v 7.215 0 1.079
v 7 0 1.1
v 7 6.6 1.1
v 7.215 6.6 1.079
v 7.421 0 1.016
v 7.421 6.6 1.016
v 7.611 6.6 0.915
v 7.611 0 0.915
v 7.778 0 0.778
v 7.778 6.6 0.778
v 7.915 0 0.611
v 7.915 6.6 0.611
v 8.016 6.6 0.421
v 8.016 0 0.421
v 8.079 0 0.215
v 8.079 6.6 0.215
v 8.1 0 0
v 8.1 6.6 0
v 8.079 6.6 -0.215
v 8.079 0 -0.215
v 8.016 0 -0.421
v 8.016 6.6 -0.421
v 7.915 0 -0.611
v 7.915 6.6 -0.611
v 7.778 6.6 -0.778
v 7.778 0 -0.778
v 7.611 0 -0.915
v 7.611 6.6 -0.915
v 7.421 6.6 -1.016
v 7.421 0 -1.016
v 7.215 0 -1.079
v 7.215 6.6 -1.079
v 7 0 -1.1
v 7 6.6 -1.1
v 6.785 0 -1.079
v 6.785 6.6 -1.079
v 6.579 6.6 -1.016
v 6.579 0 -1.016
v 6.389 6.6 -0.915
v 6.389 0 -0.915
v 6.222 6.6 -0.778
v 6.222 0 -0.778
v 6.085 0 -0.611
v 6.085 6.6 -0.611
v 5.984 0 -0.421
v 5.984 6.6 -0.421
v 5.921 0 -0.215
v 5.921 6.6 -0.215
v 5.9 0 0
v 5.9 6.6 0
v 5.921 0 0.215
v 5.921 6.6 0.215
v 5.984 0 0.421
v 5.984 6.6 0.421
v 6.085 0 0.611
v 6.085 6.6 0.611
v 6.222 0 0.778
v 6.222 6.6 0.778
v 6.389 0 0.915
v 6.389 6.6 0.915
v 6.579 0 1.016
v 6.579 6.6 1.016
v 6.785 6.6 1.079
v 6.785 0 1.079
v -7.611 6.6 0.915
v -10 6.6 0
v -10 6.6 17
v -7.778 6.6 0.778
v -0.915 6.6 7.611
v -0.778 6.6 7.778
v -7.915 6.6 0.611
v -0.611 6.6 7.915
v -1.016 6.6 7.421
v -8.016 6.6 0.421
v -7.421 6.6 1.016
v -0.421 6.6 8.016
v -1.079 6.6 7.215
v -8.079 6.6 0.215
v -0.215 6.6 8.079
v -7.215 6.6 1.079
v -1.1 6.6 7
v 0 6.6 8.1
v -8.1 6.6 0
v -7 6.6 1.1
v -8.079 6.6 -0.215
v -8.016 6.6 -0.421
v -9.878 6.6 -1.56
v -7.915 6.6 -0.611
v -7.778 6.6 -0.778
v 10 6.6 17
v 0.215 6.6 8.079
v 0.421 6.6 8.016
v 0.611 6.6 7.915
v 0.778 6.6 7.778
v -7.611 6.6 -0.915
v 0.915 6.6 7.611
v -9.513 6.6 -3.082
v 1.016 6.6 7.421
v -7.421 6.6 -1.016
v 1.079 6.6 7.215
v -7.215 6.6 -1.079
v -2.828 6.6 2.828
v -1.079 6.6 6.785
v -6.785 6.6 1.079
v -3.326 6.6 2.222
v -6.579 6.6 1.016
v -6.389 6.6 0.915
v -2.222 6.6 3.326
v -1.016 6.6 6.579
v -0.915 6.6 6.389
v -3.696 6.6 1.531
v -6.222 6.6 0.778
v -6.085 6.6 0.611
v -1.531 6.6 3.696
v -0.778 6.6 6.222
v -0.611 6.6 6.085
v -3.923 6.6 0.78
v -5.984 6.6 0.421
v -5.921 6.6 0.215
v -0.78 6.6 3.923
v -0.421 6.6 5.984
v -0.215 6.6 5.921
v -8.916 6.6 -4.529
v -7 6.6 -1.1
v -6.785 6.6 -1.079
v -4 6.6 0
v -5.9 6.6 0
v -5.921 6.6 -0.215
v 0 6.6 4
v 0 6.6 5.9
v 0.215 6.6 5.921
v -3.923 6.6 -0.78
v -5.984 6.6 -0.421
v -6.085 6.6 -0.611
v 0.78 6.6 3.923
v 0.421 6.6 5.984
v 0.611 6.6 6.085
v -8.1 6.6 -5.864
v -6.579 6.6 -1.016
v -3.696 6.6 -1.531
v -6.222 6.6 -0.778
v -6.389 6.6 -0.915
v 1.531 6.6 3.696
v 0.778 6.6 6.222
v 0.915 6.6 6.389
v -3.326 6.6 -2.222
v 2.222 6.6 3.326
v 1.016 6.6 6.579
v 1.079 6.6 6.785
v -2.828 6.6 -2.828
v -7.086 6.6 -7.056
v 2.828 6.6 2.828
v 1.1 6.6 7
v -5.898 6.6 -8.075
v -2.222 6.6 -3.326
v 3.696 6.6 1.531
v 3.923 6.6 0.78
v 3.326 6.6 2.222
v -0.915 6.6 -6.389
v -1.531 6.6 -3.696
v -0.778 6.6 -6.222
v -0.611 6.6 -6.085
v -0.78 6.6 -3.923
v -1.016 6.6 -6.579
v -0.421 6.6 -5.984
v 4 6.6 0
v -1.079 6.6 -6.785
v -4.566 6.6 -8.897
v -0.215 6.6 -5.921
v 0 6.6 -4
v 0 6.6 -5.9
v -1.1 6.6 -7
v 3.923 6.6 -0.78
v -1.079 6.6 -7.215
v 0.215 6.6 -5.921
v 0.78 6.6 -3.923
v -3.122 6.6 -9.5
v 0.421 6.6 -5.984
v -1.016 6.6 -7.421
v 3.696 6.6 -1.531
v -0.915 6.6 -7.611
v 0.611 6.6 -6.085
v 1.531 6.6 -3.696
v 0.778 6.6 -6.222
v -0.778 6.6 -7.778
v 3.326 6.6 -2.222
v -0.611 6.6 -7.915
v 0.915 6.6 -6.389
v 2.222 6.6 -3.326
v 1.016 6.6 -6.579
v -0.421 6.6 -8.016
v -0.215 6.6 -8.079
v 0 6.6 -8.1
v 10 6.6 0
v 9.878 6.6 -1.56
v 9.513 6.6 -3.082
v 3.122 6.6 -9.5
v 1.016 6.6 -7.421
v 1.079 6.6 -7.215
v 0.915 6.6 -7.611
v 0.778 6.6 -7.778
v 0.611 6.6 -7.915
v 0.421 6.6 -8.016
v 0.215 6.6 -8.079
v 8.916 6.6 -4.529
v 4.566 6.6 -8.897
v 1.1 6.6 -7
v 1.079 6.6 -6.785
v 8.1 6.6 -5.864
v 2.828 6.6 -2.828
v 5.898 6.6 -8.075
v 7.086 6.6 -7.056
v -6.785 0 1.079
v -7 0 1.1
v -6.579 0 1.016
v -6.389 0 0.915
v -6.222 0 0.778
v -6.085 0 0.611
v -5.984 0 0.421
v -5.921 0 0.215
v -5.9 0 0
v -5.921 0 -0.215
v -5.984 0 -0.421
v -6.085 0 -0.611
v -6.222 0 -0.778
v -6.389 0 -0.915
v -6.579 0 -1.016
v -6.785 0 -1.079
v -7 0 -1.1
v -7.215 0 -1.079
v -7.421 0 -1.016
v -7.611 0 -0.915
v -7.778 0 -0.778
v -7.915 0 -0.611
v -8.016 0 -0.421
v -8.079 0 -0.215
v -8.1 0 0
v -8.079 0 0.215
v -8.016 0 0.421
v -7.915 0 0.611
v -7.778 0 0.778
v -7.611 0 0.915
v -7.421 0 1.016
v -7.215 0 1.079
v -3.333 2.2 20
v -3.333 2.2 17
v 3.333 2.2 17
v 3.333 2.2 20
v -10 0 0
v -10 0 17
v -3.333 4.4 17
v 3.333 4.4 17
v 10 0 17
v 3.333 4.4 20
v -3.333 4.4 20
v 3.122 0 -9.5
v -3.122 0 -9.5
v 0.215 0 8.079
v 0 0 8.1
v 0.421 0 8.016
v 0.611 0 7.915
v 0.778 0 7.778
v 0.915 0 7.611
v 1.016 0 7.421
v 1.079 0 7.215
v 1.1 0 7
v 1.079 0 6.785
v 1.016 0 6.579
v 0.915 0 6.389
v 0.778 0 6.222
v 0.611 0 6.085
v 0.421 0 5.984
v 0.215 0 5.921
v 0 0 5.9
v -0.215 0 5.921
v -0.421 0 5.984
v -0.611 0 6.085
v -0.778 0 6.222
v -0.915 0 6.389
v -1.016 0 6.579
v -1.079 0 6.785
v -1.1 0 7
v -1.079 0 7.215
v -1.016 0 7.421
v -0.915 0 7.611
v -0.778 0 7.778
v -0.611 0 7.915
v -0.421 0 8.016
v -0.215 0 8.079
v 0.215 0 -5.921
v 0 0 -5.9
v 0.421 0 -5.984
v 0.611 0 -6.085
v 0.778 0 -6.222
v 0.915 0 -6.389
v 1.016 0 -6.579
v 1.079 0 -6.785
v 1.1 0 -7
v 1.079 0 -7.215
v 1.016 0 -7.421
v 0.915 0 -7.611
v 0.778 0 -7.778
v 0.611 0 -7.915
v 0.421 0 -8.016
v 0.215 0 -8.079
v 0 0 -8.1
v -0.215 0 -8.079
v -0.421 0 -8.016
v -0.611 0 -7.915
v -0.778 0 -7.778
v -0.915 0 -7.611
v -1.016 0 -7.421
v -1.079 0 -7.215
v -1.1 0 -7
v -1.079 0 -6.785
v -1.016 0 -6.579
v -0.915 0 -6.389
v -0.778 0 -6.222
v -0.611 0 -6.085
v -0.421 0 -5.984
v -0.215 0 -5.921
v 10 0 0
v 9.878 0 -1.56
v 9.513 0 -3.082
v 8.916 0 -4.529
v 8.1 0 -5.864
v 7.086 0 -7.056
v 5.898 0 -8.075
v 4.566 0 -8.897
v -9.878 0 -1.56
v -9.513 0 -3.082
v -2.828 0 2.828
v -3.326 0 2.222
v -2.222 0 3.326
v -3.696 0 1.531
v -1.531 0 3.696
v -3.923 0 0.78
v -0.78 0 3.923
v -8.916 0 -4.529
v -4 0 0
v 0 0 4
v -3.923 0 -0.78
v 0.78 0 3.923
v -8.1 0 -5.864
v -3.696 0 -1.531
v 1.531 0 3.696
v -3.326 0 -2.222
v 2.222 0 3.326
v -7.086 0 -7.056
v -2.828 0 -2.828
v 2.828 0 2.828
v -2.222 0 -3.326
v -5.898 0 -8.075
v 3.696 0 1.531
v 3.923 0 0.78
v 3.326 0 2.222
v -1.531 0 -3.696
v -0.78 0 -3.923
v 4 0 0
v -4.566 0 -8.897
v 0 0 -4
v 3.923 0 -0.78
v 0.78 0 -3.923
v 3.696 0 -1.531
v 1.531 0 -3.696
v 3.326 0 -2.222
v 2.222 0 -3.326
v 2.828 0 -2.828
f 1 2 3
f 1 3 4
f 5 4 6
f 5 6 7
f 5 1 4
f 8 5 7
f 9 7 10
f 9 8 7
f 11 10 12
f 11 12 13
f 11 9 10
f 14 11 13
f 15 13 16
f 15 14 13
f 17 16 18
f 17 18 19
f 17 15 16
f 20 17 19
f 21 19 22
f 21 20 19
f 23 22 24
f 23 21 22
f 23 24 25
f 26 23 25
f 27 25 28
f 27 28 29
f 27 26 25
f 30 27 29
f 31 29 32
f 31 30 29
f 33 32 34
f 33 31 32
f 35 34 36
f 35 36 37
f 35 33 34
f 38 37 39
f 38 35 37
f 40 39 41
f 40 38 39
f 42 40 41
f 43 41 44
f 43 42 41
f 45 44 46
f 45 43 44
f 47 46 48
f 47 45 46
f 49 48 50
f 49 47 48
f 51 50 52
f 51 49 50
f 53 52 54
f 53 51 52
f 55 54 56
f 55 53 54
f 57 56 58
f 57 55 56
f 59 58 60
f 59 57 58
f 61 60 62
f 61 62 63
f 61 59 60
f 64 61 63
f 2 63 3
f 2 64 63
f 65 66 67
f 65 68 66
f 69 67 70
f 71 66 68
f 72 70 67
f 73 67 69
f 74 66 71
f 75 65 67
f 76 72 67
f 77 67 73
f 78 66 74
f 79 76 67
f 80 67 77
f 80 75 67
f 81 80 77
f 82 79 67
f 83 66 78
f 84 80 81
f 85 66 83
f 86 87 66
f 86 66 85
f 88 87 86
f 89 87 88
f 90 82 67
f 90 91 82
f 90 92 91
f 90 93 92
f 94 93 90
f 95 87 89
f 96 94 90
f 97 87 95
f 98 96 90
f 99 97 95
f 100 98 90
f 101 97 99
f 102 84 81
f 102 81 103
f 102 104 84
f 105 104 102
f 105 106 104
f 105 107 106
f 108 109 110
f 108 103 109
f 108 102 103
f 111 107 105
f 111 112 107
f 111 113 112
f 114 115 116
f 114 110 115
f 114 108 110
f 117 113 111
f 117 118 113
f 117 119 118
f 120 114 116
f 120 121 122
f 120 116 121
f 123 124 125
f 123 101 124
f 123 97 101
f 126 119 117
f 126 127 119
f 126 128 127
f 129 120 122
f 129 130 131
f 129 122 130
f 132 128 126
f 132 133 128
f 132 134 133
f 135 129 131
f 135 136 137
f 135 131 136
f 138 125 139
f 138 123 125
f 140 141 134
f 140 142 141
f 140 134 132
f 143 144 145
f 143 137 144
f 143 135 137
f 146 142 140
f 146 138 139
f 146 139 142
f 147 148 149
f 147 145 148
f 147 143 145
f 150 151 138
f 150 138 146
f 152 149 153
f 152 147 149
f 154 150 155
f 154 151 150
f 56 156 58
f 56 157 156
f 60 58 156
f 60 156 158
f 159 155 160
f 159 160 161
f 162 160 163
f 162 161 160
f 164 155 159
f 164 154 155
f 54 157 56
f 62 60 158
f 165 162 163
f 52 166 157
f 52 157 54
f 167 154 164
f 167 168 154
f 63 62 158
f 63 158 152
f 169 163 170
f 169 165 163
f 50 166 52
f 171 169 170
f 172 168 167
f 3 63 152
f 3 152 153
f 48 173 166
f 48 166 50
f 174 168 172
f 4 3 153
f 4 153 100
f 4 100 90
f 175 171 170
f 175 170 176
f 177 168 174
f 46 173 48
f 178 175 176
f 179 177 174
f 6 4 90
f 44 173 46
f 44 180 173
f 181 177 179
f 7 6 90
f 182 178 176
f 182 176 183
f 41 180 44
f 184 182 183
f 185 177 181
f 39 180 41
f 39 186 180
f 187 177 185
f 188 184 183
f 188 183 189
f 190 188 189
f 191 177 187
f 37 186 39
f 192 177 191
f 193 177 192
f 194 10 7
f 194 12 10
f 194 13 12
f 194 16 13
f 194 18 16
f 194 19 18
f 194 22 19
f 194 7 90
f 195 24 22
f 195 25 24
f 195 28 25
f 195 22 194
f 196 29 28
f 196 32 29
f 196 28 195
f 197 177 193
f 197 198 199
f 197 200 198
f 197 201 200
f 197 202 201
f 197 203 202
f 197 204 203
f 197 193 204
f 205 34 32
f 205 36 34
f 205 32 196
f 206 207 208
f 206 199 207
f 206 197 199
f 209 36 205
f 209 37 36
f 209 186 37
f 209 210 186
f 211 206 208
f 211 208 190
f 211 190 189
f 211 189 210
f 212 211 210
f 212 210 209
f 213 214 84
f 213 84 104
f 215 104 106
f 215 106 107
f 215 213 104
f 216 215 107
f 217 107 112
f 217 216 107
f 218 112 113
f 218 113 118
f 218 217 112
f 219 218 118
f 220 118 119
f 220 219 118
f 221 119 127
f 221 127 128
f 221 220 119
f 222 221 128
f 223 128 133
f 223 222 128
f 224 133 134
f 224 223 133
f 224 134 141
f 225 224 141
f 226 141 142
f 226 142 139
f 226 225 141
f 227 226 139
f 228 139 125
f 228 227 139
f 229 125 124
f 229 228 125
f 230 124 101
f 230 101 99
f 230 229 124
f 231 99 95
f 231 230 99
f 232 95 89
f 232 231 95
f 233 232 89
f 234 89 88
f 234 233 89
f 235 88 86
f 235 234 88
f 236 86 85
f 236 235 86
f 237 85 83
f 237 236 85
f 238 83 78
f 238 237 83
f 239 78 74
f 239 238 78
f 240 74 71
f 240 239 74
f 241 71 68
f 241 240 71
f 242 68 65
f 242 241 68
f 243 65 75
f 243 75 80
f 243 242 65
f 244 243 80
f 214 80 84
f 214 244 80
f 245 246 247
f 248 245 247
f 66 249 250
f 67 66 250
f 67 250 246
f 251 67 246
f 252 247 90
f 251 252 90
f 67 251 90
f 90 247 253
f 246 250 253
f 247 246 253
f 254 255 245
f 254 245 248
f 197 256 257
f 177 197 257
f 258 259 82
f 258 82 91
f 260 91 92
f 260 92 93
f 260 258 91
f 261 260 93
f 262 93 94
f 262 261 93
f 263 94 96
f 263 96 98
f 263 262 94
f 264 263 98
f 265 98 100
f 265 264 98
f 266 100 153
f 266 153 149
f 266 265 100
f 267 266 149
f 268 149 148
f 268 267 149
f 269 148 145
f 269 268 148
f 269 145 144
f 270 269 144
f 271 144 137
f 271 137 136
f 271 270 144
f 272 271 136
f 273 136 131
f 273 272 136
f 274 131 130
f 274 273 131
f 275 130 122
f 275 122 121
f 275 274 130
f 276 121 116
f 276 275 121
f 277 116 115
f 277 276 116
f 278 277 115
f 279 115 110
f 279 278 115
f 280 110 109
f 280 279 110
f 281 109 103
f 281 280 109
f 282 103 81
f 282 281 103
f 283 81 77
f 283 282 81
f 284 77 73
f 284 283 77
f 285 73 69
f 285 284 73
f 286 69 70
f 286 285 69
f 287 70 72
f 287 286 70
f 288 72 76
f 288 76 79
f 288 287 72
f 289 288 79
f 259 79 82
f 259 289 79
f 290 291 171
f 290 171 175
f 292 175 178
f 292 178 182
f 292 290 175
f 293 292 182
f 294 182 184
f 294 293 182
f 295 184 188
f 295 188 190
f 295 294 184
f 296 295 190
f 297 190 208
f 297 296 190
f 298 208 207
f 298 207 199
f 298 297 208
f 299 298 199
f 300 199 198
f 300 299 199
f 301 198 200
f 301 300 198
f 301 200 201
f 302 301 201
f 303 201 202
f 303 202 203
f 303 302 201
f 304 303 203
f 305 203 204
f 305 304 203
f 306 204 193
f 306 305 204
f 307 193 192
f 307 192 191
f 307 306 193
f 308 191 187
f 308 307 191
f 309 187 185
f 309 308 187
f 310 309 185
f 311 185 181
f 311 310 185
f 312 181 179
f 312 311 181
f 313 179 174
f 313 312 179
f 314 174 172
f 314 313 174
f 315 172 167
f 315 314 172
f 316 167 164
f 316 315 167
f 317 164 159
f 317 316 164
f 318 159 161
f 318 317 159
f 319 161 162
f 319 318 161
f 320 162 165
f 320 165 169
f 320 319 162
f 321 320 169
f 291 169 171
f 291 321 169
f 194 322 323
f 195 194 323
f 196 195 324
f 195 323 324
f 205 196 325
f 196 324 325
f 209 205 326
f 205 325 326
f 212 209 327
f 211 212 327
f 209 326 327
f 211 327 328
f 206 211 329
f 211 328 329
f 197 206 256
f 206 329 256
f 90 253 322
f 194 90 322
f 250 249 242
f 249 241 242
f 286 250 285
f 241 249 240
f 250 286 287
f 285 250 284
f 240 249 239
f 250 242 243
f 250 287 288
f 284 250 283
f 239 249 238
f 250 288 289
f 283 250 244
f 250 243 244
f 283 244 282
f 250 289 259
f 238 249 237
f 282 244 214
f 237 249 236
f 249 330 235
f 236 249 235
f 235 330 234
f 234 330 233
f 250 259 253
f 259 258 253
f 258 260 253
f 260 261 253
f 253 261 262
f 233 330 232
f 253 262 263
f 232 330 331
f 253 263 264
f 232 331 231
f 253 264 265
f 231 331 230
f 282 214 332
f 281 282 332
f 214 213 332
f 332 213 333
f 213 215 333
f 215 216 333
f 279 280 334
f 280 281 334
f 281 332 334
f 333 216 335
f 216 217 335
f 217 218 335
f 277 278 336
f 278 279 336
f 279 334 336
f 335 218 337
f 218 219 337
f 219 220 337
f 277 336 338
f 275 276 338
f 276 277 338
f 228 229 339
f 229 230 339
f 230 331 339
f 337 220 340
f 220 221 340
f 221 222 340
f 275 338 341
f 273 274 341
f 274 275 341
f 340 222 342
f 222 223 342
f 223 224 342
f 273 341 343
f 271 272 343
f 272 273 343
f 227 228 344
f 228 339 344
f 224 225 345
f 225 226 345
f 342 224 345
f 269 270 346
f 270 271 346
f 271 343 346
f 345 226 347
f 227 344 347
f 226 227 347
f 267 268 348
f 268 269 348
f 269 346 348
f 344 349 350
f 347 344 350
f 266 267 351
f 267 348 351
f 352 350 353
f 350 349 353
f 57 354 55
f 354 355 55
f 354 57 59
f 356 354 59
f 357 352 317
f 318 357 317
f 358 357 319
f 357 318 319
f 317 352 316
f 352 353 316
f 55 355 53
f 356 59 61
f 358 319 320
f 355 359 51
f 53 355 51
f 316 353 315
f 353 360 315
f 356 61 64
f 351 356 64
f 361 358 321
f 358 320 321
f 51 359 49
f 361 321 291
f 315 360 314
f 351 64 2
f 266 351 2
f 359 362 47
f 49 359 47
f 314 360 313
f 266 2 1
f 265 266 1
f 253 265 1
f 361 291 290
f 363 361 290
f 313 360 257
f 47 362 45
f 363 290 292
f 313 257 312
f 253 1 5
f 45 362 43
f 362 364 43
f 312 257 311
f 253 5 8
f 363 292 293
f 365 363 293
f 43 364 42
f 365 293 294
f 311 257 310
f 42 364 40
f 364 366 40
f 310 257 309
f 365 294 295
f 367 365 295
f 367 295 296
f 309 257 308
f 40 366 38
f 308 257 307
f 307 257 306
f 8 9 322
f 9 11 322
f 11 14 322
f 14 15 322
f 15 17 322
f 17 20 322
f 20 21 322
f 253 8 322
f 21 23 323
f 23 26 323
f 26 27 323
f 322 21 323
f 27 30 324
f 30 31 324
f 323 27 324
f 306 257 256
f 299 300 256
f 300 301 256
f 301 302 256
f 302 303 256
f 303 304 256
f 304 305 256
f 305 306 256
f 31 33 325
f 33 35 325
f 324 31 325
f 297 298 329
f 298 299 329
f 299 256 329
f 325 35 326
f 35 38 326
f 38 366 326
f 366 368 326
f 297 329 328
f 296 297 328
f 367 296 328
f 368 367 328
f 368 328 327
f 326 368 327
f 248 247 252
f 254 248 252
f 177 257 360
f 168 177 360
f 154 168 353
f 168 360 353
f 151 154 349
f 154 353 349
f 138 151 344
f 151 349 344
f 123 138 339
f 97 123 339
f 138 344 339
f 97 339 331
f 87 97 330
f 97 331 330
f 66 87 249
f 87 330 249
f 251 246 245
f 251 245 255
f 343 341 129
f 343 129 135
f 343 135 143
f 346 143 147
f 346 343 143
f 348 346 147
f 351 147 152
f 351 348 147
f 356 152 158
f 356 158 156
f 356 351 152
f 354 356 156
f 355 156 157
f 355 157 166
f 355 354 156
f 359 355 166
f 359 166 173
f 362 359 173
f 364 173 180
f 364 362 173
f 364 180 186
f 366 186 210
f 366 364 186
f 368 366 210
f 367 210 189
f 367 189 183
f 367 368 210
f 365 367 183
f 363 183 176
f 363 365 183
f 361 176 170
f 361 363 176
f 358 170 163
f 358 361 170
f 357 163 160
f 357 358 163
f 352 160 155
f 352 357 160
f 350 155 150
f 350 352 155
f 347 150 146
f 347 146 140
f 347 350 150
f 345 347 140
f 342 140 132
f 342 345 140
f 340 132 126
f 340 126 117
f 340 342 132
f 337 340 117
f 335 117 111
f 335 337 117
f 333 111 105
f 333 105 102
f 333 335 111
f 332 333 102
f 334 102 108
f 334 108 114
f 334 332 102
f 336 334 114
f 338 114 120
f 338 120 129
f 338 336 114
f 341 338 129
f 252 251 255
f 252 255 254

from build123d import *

# Parameters (mm, degrees)
SKETCH_1_R      = 4
SKETCH_1_R_2    = 1.1
EXTRUDE_2_DEPTH = 6.6
SKETCH_2_W      = 6.666666666
SKETCH_2_H      = 2.2
EXTRUDE_3_DEPTH = 3


with BuildPart() as part:
    # 草图1 → 凸台-拉伸2 (new body)
    with BuildSketch(Plane(origin=(0, 0, 0), x_dir=(1, 0, 0), z_dir=(0, 1, 0))):
        with BuildLine():
            Line((-10, -17), (10, -17))
            Line((10, -17), (10, 0))
            ThreePointArc((10, 0), (8.100154011, 5.864086033), (3.122498999, 9.5))
            Line((3.122498999, 9.5), (-3.122498999, 9.5))
            ThreePointArc((-3.122498999, 9.5), (-8.100154011, 5.864086033), (-10, 0))
            Line((-10, 0), (-10, -17))
        make_face()
        with Locations(Location((0, 0, 0), (0, 0, 270))):
            Circle(SKETCH_1_R, mode=Mode.SUBTRACT)
        with Locations(Location((-7, 0, 0), (0, 0, 270))):
            Circle(SKETCH_1_R_2, mode=Mode.SUBTRACT)
        with Locations(Location((0, 7, 0), (0, 0, 270))):
            Circle(SKETCH_1_R_2, mode=Mode.SUBTRACT)
        with Locations(Location((7, 0, 0), (0, 0, 270))):
            Circle(SKETCH_1_R_2, mode=Mode.SUBTRACT)
        with Locations(Location((0, -7, 0), (0, 0, 270))):
            Circle(SKETCH_1_R_2, mode=Mode.SUBTRACT)
    extrude(amount=EXTRUDE_2_DEPTH)

    # 草图2 → 凸台-拉伸3 (add)
    with BuildSketch(Plane.XY.offset(17)):
        with Locations((0, 3.3)):
            Rectangle(SKETCH_2_W, SKETCH_2_H)
    extrude(amount=EXTRUDE_3_DEPTH)


solid = part.part
